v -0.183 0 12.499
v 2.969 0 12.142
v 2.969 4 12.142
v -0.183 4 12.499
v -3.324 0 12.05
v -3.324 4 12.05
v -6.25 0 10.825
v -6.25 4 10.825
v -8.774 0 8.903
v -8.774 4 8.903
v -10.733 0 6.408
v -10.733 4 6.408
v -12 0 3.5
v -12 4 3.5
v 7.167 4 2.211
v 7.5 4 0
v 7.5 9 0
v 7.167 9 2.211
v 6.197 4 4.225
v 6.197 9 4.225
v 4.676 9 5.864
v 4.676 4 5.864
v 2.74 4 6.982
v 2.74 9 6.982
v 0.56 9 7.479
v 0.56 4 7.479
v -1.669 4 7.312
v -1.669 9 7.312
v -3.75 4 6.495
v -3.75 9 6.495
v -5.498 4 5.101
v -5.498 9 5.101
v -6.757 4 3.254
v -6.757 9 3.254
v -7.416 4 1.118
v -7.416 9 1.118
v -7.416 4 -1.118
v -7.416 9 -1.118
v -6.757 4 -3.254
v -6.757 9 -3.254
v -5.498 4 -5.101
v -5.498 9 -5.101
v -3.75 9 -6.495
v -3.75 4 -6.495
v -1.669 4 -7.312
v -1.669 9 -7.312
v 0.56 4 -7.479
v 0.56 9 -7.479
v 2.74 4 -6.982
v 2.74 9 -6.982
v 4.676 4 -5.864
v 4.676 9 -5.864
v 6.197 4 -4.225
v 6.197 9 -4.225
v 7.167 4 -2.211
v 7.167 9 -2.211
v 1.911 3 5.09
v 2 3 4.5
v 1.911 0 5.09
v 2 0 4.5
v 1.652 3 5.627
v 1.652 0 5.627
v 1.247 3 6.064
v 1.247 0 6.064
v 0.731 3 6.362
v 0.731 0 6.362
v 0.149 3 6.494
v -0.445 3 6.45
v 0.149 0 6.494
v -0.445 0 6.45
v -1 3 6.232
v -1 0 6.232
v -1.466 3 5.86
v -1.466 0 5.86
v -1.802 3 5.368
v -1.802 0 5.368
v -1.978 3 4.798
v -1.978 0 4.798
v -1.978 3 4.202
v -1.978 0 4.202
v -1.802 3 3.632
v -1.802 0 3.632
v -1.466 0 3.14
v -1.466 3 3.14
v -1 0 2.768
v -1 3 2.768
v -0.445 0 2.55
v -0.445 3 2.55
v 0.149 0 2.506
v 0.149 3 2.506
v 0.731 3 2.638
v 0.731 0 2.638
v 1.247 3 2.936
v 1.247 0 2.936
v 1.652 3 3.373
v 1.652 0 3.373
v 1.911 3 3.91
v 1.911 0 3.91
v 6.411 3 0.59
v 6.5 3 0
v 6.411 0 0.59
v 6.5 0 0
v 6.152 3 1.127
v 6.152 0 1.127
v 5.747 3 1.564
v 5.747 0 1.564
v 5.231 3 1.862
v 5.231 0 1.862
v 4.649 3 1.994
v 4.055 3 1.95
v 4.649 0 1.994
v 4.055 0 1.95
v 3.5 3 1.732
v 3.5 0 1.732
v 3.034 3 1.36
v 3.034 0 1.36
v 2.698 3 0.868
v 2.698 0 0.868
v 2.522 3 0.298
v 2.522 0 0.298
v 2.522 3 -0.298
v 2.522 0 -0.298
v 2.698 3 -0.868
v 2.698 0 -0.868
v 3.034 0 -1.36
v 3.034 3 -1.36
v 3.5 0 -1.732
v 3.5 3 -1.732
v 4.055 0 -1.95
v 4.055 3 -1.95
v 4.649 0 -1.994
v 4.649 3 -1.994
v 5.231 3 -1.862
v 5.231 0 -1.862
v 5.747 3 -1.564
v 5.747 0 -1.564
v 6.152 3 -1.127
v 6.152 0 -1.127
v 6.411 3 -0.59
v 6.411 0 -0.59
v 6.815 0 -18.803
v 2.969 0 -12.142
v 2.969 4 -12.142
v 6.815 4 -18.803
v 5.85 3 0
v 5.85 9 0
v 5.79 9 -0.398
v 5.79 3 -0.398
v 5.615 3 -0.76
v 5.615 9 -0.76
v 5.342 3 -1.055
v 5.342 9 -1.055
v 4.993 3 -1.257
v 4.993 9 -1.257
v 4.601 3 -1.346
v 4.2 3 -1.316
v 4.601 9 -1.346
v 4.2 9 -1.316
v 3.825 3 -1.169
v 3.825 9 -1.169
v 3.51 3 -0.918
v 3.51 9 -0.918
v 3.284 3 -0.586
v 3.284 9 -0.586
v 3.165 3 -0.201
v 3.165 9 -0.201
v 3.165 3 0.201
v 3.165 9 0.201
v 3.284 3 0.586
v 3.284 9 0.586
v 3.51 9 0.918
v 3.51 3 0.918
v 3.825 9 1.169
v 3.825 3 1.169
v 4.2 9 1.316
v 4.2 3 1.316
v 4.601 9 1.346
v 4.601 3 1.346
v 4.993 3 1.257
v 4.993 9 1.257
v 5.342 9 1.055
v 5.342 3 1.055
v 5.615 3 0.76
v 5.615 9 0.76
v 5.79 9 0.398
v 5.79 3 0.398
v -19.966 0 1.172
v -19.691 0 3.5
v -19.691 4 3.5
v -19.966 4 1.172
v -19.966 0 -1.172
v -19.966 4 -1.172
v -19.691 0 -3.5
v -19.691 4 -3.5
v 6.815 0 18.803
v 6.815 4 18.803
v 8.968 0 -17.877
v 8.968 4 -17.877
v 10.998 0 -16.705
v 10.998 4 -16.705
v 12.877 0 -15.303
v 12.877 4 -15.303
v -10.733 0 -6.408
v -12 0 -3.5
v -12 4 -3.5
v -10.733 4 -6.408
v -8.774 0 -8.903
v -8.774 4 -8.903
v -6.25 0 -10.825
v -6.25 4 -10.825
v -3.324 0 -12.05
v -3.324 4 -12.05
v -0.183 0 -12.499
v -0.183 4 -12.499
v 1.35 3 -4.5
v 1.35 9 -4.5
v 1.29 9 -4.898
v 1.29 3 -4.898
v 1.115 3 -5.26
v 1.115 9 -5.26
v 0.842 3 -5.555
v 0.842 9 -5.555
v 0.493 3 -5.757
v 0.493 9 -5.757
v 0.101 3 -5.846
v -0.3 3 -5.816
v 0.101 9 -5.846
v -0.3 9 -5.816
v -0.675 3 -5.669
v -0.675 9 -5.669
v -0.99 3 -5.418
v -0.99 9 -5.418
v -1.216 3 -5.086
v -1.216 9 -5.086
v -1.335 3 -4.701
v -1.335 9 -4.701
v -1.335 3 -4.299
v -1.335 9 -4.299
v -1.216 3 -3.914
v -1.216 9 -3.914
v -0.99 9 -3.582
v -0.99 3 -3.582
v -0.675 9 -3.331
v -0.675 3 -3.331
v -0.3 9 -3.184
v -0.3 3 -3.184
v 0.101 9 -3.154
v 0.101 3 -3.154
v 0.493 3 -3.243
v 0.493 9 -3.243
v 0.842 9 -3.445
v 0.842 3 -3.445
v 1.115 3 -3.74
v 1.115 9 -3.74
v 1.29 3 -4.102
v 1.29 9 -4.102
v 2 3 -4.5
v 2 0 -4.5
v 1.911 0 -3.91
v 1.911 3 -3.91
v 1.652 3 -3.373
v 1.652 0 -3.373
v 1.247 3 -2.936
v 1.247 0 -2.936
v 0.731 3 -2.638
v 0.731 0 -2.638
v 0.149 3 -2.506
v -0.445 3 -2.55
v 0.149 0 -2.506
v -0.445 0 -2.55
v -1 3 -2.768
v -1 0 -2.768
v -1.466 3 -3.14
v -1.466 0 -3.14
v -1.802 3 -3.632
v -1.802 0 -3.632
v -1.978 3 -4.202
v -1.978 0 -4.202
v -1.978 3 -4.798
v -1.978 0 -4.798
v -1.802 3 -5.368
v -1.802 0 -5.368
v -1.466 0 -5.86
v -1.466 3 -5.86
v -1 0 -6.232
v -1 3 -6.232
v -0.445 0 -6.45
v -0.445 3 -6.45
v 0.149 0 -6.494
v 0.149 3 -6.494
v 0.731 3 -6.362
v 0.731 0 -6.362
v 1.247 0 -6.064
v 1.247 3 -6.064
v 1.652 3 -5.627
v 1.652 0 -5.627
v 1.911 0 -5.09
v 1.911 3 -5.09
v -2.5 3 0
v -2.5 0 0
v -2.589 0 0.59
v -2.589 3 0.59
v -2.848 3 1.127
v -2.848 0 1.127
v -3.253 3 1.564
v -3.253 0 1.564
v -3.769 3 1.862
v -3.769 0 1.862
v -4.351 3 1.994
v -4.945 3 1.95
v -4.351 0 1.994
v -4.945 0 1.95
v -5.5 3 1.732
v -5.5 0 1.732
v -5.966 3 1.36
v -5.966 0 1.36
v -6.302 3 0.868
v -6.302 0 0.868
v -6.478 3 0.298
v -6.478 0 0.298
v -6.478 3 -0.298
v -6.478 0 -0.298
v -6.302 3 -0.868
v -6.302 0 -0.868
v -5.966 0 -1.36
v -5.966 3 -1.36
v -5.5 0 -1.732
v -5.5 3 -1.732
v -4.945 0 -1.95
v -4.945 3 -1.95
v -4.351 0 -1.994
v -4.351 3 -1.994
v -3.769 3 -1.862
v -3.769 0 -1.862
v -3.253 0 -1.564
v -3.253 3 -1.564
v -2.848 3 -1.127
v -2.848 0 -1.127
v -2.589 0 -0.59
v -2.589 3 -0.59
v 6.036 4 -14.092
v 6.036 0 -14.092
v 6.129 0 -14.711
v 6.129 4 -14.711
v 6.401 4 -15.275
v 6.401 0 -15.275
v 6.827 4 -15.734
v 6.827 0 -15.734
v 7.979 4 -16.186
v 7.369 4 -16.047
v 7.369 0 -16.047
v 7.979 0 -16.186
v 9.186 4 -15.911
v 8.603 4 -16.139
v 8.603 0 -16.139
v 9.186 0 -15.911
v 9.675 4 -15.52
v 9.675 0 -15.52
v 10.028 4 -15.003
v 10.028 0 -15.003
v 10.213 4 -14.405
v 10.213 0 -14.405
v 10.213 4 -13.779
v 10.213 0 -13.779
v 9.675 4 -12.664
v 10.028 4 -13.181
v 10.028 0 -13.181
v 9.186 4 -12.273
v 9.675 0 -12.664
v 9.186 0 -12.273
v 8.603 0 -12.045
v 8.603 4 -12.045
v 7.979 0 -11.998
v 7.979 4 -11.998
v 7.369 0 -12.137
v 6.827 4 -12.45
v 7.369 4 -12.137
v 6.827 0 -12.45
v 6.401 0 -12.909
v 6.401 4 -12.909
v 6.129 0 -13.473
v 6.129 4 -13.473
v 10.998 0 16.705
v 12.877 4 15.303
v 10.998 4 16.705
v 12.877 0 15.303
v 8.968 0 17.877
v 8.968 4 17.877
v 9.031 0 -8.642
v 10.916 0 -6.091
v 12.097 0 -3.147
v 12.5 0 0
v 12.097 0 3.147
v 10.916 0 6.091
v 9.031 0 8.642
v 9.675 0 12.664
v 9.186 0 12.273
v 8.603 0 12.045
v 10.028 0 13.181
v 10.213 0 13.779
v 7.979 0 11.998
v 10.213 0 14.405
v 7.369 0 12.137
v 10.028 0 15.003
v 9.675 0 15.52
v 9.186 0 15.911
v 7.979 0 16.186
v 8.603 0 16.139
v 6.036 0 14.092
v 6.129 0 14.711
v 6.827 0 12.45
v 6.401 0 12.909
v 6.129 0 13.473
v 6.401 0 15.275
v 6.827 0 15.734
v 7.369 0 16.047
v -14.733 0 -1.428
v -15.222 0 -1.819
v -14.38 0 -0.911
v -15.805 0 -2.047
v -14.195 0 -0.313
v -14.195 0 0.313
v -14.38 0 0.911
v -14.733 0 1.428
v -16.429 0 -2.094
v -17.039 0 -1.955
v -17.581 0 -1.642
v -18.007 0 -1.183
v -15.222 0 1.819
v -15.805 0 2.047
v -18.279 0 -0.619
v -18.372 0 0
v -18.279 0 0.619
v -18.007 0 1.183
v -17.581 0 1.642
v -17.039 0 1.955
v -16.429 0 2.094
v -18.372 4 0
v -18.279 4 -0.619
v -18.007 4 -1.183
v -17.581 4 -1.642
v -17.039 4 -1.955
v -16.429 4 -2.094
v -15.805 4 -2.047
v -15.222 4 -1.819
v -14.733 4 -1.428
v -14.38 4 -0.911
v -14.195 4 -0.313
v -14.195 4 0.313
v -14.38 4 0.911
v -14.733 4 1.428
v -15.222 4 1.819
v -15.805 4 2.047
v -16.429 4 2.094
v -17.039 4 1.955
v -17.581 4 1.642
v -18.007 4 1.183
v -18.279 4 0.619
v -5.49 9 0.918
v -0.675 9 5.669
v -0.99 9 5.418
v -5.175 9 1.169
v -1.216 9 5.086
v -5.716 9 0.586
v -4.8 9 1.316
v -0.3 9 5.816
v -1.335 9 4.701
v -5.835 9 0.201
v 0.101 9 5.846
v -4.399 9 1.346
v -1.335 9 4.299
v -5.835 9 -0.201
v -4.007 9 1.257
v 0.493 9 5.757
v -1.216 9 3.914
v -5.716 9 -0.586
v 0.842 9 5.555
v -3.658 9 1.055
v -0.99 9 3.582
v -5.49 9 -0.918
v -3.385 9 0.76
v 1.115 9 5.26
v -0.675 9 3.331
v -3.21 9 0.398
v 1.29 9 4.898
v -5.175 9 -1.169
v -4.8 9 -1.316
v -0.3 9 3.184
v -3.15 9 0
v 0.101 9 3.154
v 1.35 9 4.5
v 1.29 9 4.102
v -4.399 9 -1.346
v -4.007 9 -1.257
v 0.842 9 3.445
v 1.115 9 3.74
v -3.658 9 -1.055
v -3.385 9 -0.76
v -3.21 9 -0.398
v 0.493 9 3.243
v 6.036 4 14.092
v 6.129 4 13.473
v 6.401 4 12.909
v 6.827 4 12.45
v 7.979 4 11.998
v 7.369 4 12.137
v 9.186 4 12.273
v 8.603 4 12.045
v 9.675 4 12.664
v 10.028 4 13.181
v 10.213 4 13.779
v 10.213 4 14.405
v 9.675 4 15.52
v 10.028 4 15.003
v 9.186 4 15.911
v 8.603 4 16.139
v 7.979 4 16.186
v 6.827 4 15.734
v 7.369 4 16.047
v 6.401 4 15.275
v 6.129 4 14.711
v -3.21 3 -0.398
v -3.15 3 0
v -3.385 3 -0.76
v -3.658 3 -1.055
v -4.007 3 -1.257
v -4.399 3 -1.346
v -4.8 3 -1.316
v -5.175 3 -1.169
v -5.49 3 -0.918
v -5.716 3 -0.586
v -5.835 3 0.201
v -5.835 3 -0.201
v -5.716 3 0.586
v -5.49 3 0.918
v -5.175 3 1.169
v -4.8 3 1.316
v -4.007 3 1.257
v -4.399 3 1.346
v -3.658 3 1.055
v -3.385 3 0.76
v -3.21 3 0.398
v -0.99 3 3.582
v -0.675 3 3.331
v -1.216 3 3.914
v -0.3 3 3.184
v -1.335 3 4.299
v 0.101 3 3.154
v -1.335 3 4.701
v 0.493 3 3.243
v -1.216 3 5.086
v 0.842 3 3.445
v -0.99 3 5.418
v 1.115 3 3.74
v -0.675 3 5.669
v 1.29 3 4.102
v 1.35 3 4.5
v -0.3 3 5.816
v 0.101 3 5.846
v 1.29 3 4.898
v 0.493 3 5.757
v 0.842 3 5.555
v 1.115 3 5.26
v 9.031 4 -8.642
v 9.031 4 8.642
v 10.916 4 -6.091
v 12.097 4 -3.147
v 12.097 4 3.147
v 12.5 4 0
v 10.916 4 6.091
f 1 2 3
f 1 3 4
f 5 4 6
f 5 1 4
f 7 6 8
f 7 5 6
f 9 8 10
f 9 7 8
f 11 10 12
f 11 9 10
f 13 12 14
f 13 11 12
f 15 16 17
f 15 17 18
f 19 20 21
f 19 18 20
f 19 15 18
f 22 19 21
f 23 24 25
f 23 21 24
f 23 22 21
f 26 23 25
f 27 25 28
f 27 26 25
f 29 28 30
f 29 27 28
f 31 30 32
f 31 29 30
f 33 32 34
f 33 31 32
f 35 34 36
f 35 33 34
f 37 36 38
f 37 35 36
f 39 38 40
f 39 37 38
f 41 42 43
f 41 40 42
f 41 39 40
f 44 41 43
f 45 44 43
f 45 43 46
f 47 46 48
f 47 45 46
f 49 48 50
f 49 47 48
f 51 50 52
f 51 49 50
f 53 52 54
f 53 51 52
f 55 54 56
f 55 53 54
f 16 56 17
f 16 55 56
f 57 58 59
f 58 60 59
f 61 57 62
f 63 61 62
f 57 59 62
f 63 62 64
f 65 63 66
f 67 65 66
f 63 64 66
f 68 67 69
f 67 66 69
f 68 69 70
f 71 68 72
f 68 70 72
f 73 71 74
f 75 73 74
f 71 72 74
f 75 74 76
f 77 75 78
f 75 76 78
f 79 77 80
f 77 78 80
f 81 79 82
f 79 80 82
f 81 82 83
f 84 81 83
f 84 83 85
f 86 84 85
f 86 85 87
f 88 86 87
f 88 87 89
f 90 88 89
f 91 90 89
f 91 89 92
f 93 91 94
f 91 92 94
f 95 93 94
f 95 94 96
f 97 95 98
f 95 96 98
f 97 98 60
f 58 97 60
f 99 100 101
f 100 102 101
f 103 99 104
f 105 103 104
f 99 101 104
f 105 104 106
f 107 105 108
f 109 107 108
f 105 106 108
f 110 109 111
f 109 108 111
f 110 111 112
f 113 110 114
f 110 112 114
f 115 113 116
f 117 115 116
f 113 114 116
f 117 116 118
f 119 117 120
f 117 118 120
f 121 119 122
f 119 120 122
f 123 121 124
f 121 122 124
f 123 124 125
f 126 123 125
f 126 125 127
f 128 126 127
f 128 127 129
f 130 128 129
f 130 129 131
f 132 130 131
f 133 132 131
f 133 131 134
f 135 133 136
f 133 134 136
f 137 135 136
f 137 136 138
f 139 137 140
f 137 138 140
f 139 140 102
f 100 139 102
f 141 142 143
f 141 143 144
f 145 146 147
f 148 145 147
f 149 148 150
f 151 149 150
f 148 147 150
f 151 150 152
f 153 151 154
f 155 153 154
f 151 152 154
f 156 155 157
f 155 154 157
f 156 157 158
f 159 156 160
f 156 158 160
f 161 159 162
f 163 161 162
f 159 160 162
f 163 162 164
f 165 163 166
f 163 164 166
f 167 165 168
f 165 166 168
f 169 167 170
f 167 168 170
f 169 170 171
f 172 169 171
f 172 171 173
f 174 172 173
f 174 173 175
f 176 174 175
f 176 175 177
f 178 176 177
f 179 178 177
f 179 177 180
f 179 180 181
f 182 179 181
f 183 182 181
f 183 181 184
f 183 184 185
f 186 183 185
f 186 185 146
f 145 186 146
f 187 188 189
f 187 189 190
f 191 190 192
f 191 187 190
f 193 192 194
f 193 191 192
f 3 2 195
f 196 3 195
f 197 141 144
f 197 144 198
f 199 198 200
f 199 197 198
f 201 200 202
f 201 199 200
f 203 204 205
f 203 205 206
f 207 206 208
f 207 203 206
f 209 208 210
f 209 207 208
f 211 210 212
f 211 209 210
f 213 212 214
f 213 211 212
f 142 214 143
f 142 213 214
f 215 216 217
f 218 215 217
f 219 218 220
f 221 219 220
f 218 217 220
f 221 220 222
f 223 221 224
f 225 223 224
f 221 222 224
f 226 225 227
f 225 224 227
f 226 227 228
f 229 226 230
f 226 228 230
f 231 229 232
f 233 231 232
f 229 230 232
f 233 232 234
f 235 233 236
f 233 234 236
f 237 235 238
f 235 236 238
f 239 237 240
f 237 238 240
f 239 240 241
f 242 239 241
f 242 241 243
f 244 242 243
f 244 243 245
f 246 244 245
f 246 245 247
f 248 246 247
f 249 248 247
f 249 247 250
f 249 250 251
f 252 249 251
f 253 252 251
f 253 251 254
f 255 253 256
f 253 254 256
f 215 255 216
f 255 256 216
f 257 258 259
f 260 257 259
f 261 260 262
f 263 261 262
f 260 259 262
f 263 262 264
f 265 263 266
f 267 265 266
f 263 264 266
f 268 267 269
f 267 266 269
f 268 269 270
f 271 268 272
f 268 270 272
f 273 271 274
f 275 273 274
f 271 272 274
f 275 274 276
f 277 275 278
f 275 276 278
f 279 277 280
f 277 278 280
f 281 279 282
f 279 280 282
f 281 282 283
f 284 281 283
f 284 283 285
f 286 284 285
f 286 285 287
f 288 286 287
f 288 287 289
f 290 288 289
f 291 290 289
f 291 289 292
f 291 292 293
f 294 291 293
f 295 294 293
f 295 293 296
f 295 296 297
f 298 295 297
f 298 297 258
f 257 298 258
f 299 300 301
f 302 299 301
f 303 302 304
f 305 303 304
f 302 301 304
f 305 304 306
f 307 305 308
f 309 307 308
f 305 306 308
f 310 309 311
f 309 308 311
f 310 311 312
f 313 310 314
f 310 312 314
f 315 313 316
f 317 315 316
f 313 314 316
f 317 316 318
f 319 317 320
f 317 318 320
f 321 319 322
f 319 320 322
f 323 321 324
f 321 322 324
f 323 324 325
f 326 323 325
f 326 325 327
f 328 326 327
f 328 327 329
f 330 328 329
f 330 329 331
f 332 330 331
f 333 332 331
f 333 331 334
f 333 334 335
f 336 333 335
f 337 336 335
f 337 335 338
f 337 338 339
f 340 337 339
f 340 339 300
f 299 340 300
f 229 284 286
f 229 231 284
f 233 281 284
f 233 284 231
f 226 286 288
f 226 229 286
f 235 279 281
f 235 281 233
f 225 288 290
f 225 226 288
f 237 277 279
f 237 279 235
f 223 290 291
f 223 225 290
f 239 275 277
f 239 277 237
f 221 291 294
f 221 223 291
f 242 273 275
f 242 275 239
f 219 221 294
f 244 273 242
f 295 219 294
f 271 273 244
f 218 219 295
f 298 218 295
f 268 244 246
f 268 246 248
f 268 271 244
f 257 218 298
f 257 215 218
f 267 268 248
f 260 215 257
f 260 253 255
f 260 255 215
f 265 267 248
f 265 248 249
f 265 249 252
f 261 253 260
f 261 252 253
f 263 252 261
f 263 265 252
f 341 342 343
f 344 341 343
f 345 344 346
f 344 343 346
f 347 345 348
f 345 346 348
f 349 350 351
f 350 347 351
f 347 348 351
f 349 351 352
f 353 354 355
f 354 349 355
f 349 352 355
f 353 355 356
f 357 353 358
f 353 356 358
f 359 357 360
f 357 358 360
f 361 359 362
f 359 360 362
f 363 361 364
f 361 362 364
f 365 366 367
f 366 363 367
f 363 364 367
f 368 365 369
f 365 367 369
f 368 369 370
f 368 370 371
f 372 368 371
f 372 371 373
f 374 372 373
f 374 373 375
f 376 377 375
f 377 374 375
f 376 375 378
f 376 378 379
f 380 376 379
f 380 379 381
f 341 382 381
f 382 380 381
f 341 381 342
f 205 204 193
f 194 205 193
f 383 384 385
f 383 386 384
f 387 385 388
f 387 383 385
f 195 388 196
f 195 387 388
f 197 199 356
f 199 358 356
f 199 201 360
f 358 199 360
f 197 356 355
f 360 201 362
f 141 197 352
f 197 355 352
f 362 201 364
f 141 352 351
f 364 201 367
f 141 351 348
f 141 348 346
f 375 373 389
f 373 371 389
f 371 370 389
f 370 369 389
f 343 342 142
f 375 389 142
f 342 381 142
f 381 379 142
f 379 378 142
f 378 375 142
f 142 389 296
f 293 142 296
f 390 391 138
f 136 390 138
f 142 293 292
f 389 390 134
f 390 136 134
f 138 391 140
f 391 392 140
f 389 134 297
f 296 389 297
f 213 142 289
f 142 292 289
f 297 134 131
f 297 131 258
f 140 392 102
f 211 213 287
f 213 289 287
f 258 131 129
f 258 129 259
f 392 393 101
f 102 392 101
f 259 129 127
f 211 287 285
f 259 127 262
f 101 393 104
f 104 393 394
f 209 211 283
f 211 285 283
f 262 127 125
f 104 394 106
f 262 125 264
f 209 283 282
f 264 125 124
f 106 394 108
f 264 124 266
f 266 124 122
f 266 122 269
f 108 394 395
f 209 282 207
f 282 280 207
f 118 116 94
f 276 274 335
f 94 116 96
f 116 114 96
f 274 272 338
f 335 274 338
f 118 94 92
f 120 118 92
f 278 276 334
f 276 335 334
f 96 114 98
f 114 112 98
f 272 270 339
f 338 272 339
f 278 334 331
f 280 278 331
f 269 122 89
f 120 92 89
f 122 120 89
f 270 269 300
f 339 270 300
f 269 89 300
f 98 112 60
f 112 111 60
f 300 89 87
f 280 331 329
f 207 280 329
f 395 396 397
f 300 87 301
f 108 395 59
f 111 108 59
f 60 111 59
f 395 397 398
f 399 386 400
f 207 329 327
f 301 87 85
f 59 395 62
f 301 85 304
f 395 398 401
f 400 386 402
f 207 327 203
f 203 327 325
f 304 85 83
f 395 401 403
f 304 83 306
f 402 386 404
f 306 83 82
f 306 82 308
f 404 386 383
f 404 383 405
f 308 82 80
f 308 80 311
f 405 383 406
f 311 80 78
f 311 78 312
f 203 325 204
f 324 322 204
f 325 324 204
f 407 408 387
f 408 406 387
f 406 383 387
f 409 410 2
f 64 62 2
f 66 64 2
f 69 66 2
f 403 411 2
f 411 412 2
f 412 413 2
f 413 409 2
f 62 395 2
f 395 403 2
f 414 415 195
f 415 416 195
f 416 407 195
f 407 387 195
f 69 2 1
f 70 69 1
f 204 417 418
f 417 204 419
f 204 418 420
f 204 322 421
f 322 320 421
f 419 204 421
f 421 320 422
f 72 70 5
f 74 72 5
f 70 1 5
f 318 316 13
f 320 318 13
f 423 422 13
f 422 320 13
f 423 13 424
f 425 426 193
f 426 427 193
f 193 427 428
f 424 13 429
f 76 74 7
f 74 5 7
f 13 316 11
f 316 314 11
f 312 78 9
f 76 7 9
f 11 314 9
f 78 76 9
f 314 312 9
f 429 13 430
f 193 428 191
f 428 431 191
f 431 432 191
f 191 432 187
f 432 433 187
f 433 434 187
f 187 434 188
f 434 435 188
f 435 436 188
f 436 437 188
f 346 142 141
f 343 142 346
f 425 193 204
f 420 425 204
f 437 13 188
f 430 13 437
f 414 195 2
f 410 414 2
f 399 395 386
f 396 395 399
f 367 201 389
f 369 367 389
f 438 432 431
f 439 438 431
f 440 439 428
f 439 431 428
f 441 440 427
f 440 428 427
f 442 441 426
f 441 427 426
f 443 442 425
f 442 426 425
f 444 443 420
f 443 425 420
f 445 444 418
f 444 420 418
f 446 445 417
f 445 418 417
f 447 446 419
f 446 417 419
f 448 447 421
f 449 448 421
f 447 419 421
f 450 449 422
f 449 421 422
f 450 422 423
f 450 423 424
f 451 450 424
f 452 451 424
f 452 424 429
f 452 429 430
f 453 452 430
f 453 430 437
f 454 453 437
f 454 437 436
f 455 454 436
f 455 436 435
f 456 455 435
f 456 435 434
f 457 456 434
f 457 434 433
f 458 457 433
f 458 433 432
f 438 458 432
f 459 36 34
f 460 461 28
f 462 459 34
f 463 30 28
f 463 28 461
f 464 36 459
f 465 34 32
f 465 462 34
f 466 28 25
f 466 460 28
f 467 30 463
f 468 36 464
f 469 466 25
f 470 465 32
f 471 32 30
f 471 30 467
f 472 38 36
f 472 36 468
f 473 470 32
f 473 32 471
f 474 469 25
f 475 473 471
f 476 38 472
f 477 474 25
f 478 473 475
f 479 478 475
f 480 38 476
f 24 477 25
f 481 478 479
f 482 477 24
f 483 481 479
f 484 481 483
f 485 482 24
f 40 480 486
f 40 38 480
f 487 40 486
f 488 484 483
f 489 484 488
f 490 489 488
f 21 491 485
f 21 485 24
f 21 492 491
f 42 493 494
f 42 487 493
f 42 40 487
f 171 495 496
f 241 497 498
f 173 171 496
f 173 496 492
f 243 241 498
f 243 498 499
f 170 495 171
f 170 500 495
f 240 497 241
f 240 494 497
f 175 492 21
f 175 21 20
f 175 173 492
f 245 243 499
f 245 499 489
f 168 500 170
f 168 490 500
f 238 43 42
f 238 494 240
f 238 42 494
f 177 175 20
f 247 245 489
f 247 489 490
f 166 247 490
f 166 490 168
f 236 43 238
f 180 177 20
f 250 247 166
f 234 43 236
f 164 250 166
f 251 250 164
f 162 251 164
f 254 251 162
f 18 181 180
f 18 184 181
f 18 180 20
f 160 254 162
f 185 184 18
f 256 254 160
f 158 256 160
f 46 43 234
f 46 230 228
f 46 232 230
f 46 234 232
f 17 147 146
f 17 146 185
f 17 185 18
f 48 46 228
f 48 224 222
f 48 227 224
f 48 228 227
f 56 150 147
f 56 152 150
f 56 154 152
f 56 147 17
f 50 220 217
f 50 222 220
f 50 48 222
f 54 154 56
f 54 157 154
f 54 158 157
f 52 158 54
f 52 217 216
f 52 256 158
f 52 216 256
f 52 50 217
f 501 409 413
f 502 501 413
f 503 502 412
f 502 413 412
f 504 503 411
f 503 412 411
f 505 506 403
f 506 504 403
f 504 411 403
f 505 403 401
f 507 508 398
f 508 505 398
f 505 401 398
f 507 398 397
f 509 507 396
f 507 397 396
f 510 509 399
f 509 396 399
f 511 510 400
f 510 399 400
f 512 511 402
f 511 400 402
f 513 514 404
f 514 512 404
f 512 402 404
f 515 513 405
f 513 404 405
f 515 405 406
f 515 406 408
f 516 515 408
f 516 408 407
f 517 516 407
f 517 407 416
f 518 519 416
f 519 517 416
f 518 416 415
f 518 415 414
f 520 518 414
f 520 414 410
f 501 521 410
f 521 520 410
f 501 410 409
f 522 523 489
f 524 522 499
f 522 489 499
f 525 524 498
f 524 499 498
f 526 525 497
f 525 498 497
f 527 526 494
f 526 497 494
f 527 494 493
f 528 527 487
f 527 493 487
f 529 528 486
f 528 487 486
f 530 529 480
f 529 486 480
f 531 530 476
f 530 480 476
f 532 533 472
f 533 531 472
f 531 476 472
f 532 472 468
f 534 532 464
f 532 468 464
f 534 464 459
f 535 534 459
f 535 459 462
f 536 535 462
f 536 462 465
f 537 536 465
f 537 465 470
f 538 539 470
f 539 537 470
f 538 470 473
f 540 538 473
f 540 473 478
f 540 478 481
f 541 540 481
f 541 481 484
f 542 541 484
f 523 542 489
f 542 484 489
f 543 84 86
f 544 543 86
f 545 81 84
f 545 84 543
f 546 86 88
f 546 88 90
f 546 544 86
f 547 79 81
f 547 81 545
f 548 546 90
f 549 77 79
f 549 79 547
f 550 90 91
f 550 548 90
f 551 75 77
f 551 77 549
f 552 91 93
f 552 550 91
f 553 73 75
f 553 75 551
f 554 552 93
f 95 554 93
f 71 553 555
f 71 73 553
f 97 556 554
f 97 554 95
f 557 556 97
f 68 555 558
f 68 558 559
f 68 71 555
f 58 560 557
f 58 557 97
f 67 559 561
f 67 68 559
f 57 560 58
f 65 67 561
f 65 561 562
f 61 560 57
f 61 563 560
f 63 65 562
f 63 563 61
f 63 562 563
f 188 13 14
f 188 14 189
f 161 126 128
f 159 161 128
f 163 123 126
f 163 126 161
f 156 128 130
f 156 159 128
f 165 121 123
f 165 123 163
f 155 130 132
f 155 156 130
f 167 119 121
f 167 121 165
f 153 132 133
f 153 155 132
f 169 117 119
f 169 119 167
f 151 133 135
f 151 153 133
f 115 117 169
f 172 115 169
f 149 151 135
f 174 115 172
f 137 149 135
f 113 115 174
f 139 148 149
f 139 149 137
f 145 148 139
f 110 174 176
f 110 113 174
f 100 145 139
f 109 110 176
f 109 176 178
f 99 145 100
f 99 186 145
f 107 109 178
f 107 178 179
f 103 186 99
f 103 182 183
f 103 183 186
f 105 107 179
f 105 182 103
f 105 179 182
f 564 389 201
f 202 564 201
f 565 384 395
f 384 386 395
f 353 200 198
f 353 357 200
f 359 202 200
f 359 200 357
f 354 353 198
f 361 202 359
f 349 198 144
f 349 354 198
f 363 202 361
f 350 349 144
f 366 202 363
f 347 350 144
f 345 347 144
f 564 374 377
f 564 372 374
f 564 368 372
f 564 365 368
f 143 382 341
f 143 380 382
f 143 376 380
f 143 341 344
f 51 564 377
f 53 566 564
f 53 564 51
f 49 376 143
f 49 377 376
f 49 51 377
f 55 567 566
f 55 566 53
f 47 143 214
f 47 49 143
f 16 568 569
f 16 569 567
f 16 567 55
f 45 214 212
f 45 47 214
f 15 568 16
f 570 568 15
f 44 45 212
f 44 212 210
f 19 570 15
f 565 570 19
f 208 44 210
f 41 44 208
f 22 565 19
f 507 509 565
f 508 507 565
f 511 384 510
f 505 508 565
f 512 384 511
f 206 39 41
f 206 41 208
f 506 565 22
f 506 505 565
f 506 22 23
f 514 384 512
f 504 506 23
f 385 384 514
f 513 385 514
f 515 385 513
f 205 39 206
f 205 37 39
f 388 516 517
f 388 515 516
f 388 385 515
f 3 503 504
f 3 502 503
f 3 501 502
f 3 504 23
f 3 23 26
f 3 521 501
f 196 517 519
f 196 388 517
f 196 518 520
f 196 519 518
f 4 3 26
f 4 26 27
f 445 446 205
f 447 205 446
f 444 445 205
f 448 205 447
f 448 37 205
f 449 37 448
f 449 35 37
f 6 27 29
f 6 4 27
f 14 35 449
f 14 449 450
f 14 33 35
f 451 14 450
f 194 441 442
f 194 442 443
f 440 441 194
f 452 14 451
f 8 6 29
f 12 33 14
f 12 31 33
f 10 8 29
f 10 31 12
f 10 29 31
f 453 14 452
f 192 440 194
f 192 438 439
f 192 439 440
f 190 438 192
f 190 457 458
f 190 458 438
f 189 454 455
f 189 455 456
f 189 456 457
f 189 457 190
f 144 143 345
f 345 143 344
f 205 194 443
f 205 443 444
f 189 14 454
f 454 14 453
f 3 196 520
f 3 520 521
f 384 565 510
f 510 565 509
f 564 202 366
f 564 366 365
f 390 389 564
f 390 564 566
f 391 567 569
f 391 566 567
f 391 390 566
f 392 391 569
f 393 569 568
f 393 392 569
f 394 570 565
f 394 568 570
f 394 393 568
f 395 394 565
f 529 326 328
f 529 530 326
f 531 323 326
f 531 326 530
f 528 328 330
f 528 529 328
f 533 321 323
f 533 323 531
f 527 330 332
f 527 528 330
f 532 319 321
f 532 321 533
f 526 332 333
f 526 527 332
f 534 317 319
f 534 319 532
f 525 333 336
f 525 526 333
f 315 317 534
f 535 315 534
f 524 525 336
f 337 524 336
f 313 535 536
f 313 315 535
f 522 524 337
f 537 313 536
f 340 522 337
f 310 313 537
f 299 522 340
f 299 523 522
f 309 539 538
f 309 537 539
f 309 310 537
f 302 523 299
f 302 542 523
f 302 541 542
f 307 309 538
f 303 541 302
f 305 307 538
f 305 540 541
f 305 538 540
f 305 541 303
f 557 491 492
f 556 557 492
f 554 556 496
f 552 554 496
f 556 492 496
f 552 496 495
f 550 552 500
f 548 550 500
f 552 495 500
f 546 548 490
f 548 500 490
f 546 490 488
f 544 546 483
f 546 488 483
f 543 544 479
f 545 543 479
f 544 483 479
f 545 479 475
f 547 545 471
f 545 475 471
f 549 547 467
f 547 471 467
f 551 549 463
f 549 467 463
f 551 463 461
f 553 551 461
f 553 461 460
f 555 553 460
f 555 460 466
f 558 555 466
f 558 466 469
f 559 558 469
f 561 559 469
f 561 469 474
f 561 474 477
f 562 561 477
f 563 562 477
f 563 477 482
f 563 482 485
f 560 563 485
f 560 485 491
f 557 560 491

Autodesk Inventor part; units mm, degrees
ref_plane "YZ Plane" through (0, 0, 0) normal (1, 0, 0) x (0, 1, 0)
ref_plane "XZ Plane" through (0, 0, 0) normal (0, 1, 0) x (-1, 0, 0)
ref_plane "XY Plane" through (0, 0, 0) normal (0, 0, 1) x (1, 0, 0)
sketch "Sketch1" plane through (0, 0, 0) normal (0, 1, 0) x (-1, 0, 0)
  circle A0 centre (16.272, 0) radius 2.1
  line L0 (14.741, 3.5) -> (19.6914, 3.5)
  line L1 (14.741, -3.5) -> (19.6914, -3.5)
  line L2 (14.741, 3.5) -> (12, 3.5)
  line L3 (14.741, -3.5) -> (12, -3.5)
  line L4 (-2.9689, 12.1423) -> (-6.8146, 18.8032)
  line L5 (-12.8768, 15.3032) -> (-9.0311, 8.6423)
  line L6 (12, -3.5) -> (19.6914, -3.5)
  line L7 (12, 3.5) -> (19.6914, 3.5)
  line L8 (-2.9689, -12.1423) -> (-6.8146, -18.8032)
  line L9 (-9.0311, -8.6423) -> (-12.8768, -15.3032)
  arc A1 (-6.8146, 18.8032) -> (-12.8768, 15.3032) centre (0, 0) ccw
  arc A2 (-12.8768, -15.3032) -> (-6.8146, -18.8032) centre (0, 0) ccw
  arc A3 (19.6914, -3.5) -> (19.6914, 3.5) centre (0, 0) ccw
  arc A4 (-9.0311, 8.6423) -> (-9.0311, -8.6423) centre (0, 0) ccw
  arc A5 (-2.9689, -12.1423) -> (12, -3.5) centre (0, 0) ccw
  arc A6 (12, 3.5) -> (-2.9689, 12.1423) centre (0, 0) ccw
  line L10 (0, 0) -> (16.272, 0)
  circle A7 centre (-8.136, 14.092) radius 2.1
  circle A8 centre (-8.136, -14.092) radius 2.1
  dimension "d6" = 4.2
  dimension "d20" = 16.272
  dimension "d23" = 360
extrude "Extrusion1" add sketch "Sketch1" along normal blind 4
sketch "Sketch2" plane through (0, 4, 0) normal (0, 1, 0) x (1, 0, 0)
  circle A0 centre (0, 0) radius 7.5
extrude "Extrusion2" add sketch "Sketch2" along normal blind 5
sketch "Sketch3" plane through (0, 9, 0) normal (0, 1, 0) x (1, 0, 0)
  circle A0 centre (-4.5, 0) radius 1.35
  circle A1 centre (0, -4.5) radius 1.35
  circle A2 centre (4.5, 0) radius 1.35
  circle A3 centre (0, 4.5) radius 1.35
  point P0 (0, 0)
  point P1 (0, 0)
  dimension "d26" = 2.7
  dimension "d30" = 360
extrude "Extrusion3" cut sketch "Sketch3" against normal through all
sketch "Sketch4" plane through (0, 0, 0) normal (0, -1, 0) x (1, 0, 0)
  circle A0 centre (-4.5, 0) radius 1.35 projected
  circle A1 centre (-4.5, 0) radius 2
  circle A2 centre (0, -4.5) radius 2
  circle A3 centre (4.5, 0) radius 2
  circle A4 centre (0, 4.5) radius 2
  point P0 (0, 0)
  point P1 (0, 0)
  dimension "d34" = 4
  dimension "d37" = 360
extrude "Extrusion4" cut sketch "Sketch4" against normal blind 3
properties part number "Planet_Gear_Output"
